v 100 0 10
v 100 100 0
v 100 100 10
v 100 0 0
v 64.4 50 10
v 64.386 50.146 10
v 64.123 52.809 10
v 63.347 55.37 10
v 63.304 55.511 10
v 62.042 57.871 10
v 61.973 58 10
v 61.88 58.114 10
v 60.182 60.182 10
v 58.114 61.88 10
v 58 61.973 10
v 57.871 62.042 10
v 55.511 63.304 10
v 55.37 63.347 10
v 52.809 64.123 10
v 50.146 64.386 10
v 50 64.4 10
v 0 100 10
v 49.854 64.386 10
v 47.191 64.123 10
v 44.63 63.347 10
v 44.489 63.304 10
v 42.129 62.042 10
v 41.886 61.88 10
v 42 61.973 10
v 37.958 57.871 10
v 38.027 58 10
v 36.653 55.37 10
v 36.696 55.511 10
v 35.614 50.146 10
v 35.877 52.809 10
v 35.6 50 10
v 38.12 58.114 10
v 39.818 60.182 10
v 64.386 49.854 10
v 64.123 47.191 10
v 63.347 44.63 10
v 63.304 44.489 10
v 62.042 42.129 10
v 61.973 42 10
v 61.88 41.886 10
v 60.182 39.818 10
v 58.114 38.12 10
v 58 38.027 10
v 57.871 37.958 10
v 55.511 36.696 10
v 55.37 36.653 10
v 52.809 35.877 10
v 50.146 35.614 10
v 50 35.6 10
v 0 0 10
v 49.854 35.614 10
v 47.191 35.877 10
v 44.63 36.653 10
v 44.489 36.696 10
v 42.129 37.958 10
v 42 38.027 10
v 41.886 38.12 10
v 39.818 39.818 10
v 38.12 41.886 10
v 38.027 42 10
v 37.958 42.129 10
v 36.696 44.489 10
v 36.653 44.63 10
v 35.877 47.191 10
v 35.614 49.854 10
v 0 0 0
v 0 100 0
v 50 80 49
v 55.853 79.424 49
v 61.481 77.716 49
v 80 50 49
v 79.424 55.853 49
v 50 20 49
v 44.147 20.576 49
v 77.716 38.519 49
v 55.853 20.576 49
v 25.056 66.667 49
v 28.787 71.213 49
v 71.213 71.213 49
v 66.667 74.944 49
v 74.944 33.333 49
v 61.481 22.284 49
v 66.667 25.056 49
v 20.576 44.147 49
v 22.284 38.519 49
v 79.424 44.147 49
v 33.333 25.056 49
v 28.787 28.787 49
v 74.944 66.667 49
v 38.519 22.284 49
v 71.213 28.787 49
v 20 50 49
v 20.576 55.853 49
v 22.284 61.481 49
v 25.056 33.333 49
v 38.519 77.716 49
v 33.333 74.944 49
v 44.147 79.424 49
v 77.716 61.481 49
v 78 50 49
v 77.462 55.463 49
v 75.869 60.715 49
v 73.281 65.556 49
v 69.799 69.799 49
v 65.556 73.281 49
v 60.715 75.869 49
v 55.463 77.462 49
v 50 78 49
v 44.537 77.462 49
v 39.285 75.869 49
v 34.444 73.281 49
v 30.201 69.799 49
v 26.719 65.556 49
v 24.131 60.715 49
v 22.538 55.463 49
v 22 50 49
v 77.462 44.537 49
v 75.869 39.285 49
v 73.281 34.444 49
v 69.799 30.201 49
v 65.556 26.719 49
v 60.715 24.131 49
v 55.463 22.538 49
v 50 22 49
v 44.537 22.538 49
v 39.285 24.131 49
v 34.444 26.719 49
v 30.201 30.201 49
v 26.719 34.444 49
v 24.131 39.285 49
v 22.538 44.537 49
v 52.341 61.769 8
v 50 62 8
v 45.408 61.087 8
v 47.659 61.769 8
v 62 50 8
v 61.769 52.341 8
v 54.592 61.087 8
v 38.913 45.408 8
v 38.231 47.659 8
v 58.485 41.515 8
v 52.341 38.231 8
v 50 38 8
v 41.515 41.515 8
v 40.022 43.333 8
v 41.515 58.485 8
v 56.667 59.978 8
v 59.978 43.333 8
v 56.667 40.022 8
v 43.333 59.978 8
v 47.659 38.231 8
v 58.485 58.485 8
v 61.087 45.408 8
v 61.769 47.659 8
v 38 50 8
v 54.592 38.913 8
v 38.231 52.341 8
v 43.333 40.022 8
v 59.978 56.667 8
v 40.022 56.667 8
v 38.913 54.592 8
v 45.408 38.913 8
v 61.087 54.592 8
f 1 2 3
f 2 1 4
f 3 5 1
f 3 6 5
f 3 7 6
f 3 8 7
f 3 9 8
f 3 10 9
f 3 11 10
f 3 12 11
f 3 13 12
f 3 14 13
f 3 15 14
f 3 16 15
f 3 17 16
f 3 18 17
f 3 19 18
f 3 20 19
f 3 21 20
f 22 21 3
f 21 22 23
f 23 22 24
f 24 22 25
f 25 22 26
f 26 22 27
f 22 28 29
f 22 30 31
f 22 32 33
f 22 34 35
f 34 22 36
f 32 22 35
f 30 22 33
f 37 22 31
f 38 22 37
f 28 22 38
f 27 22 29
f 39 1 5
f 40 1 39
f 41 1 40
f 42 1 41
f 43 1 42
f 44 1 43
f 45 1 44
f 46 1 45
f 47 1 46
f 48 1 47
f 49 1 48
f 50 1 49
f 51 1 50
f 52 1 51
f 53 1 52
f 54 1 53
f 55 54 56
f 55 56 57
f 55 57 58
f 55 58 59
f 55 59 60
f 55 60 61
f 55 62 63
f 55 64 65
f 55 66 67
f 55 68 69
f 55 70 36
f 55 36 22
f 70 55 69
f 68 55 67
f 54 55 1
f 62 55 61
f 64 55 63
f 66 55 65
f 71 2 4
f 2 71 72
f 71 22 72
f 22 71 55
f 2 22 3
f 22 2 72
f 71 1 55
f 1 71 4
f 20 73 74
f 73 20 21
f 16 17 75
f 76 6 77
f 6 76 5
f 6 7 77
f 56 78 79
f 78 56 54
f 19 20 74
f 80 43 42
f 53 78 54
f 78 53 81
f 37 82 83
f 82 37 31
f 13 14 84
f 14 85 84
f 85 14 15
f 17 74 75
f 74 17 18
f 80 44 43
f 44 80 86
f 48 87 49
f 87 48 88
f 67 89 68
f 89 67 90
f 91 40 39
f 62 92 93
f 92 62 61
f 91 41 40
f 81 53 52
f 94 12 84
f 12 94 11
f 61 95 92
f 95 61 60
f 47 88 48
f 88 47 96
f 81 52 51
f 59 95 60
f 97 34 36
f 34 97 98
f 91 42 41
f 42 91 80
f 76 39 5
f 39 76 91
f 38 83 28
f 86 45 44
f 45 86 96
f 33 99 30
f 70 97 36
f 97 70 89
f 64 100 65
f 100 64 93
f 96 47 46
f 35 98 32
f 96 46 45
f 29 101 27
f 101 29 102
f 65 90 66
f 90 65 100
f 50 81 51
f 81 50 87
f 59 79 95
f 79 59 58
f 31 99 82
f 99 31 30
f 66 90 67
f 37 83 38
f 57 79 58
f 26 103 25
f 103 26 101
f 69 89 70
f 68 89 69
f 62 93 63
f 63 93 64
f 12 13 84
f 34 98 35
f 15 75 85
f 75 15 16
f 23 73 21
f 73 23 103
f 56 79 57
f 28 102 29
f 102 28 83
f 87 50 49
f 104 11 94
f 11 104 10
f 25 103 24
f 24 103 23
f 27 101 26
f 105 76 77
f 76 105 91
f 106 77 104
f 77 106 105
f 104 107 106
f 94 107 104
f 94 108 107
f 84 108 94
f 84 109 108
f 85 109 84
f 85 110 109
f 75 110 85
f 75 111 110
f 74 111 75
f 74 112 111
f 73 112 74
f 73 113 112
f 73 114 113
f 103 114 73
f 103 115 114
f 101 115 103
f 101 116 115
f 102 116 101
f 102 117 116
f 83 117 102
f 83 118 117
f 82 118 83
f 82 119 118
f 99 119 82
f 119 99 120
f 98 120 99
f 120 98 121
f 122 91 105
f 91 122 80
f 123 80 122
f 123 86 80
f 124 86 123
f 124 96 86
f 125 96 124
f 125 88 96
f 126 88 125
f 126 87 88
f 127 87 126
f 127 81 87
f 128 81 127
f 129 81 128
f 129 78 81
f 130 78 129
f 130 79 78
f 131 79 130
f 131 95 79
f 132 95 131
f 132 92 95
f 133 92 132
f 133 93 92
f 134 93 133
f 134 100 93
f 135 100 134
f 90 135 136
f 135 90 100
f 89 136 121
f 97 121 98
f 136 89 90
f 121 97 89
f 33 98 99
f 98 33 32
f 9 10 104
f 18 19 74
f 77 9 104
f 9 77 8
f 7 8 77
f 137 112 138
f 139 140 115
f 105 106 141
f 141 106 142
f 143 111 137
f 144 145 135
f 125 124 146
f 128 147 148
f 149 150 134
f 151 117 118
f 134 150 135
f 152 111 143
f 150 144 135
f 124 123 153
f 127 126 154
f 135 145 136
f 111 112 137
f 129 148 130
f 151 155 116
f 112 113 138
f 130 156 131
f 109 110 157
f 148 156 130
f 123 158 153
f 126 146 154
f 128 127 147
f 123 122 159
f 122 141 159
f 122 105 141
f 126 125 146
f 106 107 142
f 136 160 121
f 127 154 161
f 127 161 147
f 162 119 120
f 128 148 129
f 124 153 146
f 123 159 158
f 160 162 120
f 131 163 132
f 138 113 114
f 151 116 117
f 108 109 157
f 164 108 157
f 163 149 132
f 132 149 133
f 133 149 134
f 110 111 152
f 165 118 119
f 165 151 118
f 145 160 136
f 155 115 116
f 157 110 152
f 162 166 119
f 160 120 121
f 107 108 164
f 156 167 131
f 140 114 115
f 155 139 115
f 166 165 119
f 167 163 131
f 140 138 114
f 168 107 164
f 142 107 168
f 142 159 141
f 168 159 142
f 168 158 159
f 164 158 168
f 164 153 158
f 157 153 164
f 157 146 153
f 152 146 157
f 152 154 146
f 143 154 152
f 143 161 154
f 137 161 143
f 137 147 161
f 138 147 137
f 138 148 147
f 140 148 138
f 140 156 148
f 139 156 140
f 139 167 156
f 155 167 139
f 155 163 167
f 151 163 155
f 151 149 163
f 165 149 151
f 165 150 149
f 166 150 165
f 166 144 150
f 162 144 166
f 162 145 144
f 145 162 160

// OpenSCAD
$fn = 32;

// ----------------------------------------------------------------------
// Hopper: funnel with square flange
// ----------------------------------------------------------------------

// --- parameters (mm) ---
fl = 100;                 // flange side, X and Y
fl_t = 10;                // flange thickness
cone_h = 40;              // cone height above the flange
top_d = 60;               // cone mouth diameter
bot_d = 28;               // cone spout diameter
wall = 2;                 // cone wall thickness

bore_d = bot_d - 2 * wall;  // spout bore diameter
total_h = fl_t + cone_h - 1;  // overall height

difference() {
  union() {
    cube([fl, fl, fl_t]);
    translate([fl / 2, fl / 2, fl_t - 1])
      cylinder(h = cone_h, d1 = bot_d, d2 = top_d);
  }
  translate([fl / 2, fl / 2, fl_t - 2])
    cylinder(h = cone_h + 1, d1 = bore_d, d2 = top_d - 2 * wall);
}
